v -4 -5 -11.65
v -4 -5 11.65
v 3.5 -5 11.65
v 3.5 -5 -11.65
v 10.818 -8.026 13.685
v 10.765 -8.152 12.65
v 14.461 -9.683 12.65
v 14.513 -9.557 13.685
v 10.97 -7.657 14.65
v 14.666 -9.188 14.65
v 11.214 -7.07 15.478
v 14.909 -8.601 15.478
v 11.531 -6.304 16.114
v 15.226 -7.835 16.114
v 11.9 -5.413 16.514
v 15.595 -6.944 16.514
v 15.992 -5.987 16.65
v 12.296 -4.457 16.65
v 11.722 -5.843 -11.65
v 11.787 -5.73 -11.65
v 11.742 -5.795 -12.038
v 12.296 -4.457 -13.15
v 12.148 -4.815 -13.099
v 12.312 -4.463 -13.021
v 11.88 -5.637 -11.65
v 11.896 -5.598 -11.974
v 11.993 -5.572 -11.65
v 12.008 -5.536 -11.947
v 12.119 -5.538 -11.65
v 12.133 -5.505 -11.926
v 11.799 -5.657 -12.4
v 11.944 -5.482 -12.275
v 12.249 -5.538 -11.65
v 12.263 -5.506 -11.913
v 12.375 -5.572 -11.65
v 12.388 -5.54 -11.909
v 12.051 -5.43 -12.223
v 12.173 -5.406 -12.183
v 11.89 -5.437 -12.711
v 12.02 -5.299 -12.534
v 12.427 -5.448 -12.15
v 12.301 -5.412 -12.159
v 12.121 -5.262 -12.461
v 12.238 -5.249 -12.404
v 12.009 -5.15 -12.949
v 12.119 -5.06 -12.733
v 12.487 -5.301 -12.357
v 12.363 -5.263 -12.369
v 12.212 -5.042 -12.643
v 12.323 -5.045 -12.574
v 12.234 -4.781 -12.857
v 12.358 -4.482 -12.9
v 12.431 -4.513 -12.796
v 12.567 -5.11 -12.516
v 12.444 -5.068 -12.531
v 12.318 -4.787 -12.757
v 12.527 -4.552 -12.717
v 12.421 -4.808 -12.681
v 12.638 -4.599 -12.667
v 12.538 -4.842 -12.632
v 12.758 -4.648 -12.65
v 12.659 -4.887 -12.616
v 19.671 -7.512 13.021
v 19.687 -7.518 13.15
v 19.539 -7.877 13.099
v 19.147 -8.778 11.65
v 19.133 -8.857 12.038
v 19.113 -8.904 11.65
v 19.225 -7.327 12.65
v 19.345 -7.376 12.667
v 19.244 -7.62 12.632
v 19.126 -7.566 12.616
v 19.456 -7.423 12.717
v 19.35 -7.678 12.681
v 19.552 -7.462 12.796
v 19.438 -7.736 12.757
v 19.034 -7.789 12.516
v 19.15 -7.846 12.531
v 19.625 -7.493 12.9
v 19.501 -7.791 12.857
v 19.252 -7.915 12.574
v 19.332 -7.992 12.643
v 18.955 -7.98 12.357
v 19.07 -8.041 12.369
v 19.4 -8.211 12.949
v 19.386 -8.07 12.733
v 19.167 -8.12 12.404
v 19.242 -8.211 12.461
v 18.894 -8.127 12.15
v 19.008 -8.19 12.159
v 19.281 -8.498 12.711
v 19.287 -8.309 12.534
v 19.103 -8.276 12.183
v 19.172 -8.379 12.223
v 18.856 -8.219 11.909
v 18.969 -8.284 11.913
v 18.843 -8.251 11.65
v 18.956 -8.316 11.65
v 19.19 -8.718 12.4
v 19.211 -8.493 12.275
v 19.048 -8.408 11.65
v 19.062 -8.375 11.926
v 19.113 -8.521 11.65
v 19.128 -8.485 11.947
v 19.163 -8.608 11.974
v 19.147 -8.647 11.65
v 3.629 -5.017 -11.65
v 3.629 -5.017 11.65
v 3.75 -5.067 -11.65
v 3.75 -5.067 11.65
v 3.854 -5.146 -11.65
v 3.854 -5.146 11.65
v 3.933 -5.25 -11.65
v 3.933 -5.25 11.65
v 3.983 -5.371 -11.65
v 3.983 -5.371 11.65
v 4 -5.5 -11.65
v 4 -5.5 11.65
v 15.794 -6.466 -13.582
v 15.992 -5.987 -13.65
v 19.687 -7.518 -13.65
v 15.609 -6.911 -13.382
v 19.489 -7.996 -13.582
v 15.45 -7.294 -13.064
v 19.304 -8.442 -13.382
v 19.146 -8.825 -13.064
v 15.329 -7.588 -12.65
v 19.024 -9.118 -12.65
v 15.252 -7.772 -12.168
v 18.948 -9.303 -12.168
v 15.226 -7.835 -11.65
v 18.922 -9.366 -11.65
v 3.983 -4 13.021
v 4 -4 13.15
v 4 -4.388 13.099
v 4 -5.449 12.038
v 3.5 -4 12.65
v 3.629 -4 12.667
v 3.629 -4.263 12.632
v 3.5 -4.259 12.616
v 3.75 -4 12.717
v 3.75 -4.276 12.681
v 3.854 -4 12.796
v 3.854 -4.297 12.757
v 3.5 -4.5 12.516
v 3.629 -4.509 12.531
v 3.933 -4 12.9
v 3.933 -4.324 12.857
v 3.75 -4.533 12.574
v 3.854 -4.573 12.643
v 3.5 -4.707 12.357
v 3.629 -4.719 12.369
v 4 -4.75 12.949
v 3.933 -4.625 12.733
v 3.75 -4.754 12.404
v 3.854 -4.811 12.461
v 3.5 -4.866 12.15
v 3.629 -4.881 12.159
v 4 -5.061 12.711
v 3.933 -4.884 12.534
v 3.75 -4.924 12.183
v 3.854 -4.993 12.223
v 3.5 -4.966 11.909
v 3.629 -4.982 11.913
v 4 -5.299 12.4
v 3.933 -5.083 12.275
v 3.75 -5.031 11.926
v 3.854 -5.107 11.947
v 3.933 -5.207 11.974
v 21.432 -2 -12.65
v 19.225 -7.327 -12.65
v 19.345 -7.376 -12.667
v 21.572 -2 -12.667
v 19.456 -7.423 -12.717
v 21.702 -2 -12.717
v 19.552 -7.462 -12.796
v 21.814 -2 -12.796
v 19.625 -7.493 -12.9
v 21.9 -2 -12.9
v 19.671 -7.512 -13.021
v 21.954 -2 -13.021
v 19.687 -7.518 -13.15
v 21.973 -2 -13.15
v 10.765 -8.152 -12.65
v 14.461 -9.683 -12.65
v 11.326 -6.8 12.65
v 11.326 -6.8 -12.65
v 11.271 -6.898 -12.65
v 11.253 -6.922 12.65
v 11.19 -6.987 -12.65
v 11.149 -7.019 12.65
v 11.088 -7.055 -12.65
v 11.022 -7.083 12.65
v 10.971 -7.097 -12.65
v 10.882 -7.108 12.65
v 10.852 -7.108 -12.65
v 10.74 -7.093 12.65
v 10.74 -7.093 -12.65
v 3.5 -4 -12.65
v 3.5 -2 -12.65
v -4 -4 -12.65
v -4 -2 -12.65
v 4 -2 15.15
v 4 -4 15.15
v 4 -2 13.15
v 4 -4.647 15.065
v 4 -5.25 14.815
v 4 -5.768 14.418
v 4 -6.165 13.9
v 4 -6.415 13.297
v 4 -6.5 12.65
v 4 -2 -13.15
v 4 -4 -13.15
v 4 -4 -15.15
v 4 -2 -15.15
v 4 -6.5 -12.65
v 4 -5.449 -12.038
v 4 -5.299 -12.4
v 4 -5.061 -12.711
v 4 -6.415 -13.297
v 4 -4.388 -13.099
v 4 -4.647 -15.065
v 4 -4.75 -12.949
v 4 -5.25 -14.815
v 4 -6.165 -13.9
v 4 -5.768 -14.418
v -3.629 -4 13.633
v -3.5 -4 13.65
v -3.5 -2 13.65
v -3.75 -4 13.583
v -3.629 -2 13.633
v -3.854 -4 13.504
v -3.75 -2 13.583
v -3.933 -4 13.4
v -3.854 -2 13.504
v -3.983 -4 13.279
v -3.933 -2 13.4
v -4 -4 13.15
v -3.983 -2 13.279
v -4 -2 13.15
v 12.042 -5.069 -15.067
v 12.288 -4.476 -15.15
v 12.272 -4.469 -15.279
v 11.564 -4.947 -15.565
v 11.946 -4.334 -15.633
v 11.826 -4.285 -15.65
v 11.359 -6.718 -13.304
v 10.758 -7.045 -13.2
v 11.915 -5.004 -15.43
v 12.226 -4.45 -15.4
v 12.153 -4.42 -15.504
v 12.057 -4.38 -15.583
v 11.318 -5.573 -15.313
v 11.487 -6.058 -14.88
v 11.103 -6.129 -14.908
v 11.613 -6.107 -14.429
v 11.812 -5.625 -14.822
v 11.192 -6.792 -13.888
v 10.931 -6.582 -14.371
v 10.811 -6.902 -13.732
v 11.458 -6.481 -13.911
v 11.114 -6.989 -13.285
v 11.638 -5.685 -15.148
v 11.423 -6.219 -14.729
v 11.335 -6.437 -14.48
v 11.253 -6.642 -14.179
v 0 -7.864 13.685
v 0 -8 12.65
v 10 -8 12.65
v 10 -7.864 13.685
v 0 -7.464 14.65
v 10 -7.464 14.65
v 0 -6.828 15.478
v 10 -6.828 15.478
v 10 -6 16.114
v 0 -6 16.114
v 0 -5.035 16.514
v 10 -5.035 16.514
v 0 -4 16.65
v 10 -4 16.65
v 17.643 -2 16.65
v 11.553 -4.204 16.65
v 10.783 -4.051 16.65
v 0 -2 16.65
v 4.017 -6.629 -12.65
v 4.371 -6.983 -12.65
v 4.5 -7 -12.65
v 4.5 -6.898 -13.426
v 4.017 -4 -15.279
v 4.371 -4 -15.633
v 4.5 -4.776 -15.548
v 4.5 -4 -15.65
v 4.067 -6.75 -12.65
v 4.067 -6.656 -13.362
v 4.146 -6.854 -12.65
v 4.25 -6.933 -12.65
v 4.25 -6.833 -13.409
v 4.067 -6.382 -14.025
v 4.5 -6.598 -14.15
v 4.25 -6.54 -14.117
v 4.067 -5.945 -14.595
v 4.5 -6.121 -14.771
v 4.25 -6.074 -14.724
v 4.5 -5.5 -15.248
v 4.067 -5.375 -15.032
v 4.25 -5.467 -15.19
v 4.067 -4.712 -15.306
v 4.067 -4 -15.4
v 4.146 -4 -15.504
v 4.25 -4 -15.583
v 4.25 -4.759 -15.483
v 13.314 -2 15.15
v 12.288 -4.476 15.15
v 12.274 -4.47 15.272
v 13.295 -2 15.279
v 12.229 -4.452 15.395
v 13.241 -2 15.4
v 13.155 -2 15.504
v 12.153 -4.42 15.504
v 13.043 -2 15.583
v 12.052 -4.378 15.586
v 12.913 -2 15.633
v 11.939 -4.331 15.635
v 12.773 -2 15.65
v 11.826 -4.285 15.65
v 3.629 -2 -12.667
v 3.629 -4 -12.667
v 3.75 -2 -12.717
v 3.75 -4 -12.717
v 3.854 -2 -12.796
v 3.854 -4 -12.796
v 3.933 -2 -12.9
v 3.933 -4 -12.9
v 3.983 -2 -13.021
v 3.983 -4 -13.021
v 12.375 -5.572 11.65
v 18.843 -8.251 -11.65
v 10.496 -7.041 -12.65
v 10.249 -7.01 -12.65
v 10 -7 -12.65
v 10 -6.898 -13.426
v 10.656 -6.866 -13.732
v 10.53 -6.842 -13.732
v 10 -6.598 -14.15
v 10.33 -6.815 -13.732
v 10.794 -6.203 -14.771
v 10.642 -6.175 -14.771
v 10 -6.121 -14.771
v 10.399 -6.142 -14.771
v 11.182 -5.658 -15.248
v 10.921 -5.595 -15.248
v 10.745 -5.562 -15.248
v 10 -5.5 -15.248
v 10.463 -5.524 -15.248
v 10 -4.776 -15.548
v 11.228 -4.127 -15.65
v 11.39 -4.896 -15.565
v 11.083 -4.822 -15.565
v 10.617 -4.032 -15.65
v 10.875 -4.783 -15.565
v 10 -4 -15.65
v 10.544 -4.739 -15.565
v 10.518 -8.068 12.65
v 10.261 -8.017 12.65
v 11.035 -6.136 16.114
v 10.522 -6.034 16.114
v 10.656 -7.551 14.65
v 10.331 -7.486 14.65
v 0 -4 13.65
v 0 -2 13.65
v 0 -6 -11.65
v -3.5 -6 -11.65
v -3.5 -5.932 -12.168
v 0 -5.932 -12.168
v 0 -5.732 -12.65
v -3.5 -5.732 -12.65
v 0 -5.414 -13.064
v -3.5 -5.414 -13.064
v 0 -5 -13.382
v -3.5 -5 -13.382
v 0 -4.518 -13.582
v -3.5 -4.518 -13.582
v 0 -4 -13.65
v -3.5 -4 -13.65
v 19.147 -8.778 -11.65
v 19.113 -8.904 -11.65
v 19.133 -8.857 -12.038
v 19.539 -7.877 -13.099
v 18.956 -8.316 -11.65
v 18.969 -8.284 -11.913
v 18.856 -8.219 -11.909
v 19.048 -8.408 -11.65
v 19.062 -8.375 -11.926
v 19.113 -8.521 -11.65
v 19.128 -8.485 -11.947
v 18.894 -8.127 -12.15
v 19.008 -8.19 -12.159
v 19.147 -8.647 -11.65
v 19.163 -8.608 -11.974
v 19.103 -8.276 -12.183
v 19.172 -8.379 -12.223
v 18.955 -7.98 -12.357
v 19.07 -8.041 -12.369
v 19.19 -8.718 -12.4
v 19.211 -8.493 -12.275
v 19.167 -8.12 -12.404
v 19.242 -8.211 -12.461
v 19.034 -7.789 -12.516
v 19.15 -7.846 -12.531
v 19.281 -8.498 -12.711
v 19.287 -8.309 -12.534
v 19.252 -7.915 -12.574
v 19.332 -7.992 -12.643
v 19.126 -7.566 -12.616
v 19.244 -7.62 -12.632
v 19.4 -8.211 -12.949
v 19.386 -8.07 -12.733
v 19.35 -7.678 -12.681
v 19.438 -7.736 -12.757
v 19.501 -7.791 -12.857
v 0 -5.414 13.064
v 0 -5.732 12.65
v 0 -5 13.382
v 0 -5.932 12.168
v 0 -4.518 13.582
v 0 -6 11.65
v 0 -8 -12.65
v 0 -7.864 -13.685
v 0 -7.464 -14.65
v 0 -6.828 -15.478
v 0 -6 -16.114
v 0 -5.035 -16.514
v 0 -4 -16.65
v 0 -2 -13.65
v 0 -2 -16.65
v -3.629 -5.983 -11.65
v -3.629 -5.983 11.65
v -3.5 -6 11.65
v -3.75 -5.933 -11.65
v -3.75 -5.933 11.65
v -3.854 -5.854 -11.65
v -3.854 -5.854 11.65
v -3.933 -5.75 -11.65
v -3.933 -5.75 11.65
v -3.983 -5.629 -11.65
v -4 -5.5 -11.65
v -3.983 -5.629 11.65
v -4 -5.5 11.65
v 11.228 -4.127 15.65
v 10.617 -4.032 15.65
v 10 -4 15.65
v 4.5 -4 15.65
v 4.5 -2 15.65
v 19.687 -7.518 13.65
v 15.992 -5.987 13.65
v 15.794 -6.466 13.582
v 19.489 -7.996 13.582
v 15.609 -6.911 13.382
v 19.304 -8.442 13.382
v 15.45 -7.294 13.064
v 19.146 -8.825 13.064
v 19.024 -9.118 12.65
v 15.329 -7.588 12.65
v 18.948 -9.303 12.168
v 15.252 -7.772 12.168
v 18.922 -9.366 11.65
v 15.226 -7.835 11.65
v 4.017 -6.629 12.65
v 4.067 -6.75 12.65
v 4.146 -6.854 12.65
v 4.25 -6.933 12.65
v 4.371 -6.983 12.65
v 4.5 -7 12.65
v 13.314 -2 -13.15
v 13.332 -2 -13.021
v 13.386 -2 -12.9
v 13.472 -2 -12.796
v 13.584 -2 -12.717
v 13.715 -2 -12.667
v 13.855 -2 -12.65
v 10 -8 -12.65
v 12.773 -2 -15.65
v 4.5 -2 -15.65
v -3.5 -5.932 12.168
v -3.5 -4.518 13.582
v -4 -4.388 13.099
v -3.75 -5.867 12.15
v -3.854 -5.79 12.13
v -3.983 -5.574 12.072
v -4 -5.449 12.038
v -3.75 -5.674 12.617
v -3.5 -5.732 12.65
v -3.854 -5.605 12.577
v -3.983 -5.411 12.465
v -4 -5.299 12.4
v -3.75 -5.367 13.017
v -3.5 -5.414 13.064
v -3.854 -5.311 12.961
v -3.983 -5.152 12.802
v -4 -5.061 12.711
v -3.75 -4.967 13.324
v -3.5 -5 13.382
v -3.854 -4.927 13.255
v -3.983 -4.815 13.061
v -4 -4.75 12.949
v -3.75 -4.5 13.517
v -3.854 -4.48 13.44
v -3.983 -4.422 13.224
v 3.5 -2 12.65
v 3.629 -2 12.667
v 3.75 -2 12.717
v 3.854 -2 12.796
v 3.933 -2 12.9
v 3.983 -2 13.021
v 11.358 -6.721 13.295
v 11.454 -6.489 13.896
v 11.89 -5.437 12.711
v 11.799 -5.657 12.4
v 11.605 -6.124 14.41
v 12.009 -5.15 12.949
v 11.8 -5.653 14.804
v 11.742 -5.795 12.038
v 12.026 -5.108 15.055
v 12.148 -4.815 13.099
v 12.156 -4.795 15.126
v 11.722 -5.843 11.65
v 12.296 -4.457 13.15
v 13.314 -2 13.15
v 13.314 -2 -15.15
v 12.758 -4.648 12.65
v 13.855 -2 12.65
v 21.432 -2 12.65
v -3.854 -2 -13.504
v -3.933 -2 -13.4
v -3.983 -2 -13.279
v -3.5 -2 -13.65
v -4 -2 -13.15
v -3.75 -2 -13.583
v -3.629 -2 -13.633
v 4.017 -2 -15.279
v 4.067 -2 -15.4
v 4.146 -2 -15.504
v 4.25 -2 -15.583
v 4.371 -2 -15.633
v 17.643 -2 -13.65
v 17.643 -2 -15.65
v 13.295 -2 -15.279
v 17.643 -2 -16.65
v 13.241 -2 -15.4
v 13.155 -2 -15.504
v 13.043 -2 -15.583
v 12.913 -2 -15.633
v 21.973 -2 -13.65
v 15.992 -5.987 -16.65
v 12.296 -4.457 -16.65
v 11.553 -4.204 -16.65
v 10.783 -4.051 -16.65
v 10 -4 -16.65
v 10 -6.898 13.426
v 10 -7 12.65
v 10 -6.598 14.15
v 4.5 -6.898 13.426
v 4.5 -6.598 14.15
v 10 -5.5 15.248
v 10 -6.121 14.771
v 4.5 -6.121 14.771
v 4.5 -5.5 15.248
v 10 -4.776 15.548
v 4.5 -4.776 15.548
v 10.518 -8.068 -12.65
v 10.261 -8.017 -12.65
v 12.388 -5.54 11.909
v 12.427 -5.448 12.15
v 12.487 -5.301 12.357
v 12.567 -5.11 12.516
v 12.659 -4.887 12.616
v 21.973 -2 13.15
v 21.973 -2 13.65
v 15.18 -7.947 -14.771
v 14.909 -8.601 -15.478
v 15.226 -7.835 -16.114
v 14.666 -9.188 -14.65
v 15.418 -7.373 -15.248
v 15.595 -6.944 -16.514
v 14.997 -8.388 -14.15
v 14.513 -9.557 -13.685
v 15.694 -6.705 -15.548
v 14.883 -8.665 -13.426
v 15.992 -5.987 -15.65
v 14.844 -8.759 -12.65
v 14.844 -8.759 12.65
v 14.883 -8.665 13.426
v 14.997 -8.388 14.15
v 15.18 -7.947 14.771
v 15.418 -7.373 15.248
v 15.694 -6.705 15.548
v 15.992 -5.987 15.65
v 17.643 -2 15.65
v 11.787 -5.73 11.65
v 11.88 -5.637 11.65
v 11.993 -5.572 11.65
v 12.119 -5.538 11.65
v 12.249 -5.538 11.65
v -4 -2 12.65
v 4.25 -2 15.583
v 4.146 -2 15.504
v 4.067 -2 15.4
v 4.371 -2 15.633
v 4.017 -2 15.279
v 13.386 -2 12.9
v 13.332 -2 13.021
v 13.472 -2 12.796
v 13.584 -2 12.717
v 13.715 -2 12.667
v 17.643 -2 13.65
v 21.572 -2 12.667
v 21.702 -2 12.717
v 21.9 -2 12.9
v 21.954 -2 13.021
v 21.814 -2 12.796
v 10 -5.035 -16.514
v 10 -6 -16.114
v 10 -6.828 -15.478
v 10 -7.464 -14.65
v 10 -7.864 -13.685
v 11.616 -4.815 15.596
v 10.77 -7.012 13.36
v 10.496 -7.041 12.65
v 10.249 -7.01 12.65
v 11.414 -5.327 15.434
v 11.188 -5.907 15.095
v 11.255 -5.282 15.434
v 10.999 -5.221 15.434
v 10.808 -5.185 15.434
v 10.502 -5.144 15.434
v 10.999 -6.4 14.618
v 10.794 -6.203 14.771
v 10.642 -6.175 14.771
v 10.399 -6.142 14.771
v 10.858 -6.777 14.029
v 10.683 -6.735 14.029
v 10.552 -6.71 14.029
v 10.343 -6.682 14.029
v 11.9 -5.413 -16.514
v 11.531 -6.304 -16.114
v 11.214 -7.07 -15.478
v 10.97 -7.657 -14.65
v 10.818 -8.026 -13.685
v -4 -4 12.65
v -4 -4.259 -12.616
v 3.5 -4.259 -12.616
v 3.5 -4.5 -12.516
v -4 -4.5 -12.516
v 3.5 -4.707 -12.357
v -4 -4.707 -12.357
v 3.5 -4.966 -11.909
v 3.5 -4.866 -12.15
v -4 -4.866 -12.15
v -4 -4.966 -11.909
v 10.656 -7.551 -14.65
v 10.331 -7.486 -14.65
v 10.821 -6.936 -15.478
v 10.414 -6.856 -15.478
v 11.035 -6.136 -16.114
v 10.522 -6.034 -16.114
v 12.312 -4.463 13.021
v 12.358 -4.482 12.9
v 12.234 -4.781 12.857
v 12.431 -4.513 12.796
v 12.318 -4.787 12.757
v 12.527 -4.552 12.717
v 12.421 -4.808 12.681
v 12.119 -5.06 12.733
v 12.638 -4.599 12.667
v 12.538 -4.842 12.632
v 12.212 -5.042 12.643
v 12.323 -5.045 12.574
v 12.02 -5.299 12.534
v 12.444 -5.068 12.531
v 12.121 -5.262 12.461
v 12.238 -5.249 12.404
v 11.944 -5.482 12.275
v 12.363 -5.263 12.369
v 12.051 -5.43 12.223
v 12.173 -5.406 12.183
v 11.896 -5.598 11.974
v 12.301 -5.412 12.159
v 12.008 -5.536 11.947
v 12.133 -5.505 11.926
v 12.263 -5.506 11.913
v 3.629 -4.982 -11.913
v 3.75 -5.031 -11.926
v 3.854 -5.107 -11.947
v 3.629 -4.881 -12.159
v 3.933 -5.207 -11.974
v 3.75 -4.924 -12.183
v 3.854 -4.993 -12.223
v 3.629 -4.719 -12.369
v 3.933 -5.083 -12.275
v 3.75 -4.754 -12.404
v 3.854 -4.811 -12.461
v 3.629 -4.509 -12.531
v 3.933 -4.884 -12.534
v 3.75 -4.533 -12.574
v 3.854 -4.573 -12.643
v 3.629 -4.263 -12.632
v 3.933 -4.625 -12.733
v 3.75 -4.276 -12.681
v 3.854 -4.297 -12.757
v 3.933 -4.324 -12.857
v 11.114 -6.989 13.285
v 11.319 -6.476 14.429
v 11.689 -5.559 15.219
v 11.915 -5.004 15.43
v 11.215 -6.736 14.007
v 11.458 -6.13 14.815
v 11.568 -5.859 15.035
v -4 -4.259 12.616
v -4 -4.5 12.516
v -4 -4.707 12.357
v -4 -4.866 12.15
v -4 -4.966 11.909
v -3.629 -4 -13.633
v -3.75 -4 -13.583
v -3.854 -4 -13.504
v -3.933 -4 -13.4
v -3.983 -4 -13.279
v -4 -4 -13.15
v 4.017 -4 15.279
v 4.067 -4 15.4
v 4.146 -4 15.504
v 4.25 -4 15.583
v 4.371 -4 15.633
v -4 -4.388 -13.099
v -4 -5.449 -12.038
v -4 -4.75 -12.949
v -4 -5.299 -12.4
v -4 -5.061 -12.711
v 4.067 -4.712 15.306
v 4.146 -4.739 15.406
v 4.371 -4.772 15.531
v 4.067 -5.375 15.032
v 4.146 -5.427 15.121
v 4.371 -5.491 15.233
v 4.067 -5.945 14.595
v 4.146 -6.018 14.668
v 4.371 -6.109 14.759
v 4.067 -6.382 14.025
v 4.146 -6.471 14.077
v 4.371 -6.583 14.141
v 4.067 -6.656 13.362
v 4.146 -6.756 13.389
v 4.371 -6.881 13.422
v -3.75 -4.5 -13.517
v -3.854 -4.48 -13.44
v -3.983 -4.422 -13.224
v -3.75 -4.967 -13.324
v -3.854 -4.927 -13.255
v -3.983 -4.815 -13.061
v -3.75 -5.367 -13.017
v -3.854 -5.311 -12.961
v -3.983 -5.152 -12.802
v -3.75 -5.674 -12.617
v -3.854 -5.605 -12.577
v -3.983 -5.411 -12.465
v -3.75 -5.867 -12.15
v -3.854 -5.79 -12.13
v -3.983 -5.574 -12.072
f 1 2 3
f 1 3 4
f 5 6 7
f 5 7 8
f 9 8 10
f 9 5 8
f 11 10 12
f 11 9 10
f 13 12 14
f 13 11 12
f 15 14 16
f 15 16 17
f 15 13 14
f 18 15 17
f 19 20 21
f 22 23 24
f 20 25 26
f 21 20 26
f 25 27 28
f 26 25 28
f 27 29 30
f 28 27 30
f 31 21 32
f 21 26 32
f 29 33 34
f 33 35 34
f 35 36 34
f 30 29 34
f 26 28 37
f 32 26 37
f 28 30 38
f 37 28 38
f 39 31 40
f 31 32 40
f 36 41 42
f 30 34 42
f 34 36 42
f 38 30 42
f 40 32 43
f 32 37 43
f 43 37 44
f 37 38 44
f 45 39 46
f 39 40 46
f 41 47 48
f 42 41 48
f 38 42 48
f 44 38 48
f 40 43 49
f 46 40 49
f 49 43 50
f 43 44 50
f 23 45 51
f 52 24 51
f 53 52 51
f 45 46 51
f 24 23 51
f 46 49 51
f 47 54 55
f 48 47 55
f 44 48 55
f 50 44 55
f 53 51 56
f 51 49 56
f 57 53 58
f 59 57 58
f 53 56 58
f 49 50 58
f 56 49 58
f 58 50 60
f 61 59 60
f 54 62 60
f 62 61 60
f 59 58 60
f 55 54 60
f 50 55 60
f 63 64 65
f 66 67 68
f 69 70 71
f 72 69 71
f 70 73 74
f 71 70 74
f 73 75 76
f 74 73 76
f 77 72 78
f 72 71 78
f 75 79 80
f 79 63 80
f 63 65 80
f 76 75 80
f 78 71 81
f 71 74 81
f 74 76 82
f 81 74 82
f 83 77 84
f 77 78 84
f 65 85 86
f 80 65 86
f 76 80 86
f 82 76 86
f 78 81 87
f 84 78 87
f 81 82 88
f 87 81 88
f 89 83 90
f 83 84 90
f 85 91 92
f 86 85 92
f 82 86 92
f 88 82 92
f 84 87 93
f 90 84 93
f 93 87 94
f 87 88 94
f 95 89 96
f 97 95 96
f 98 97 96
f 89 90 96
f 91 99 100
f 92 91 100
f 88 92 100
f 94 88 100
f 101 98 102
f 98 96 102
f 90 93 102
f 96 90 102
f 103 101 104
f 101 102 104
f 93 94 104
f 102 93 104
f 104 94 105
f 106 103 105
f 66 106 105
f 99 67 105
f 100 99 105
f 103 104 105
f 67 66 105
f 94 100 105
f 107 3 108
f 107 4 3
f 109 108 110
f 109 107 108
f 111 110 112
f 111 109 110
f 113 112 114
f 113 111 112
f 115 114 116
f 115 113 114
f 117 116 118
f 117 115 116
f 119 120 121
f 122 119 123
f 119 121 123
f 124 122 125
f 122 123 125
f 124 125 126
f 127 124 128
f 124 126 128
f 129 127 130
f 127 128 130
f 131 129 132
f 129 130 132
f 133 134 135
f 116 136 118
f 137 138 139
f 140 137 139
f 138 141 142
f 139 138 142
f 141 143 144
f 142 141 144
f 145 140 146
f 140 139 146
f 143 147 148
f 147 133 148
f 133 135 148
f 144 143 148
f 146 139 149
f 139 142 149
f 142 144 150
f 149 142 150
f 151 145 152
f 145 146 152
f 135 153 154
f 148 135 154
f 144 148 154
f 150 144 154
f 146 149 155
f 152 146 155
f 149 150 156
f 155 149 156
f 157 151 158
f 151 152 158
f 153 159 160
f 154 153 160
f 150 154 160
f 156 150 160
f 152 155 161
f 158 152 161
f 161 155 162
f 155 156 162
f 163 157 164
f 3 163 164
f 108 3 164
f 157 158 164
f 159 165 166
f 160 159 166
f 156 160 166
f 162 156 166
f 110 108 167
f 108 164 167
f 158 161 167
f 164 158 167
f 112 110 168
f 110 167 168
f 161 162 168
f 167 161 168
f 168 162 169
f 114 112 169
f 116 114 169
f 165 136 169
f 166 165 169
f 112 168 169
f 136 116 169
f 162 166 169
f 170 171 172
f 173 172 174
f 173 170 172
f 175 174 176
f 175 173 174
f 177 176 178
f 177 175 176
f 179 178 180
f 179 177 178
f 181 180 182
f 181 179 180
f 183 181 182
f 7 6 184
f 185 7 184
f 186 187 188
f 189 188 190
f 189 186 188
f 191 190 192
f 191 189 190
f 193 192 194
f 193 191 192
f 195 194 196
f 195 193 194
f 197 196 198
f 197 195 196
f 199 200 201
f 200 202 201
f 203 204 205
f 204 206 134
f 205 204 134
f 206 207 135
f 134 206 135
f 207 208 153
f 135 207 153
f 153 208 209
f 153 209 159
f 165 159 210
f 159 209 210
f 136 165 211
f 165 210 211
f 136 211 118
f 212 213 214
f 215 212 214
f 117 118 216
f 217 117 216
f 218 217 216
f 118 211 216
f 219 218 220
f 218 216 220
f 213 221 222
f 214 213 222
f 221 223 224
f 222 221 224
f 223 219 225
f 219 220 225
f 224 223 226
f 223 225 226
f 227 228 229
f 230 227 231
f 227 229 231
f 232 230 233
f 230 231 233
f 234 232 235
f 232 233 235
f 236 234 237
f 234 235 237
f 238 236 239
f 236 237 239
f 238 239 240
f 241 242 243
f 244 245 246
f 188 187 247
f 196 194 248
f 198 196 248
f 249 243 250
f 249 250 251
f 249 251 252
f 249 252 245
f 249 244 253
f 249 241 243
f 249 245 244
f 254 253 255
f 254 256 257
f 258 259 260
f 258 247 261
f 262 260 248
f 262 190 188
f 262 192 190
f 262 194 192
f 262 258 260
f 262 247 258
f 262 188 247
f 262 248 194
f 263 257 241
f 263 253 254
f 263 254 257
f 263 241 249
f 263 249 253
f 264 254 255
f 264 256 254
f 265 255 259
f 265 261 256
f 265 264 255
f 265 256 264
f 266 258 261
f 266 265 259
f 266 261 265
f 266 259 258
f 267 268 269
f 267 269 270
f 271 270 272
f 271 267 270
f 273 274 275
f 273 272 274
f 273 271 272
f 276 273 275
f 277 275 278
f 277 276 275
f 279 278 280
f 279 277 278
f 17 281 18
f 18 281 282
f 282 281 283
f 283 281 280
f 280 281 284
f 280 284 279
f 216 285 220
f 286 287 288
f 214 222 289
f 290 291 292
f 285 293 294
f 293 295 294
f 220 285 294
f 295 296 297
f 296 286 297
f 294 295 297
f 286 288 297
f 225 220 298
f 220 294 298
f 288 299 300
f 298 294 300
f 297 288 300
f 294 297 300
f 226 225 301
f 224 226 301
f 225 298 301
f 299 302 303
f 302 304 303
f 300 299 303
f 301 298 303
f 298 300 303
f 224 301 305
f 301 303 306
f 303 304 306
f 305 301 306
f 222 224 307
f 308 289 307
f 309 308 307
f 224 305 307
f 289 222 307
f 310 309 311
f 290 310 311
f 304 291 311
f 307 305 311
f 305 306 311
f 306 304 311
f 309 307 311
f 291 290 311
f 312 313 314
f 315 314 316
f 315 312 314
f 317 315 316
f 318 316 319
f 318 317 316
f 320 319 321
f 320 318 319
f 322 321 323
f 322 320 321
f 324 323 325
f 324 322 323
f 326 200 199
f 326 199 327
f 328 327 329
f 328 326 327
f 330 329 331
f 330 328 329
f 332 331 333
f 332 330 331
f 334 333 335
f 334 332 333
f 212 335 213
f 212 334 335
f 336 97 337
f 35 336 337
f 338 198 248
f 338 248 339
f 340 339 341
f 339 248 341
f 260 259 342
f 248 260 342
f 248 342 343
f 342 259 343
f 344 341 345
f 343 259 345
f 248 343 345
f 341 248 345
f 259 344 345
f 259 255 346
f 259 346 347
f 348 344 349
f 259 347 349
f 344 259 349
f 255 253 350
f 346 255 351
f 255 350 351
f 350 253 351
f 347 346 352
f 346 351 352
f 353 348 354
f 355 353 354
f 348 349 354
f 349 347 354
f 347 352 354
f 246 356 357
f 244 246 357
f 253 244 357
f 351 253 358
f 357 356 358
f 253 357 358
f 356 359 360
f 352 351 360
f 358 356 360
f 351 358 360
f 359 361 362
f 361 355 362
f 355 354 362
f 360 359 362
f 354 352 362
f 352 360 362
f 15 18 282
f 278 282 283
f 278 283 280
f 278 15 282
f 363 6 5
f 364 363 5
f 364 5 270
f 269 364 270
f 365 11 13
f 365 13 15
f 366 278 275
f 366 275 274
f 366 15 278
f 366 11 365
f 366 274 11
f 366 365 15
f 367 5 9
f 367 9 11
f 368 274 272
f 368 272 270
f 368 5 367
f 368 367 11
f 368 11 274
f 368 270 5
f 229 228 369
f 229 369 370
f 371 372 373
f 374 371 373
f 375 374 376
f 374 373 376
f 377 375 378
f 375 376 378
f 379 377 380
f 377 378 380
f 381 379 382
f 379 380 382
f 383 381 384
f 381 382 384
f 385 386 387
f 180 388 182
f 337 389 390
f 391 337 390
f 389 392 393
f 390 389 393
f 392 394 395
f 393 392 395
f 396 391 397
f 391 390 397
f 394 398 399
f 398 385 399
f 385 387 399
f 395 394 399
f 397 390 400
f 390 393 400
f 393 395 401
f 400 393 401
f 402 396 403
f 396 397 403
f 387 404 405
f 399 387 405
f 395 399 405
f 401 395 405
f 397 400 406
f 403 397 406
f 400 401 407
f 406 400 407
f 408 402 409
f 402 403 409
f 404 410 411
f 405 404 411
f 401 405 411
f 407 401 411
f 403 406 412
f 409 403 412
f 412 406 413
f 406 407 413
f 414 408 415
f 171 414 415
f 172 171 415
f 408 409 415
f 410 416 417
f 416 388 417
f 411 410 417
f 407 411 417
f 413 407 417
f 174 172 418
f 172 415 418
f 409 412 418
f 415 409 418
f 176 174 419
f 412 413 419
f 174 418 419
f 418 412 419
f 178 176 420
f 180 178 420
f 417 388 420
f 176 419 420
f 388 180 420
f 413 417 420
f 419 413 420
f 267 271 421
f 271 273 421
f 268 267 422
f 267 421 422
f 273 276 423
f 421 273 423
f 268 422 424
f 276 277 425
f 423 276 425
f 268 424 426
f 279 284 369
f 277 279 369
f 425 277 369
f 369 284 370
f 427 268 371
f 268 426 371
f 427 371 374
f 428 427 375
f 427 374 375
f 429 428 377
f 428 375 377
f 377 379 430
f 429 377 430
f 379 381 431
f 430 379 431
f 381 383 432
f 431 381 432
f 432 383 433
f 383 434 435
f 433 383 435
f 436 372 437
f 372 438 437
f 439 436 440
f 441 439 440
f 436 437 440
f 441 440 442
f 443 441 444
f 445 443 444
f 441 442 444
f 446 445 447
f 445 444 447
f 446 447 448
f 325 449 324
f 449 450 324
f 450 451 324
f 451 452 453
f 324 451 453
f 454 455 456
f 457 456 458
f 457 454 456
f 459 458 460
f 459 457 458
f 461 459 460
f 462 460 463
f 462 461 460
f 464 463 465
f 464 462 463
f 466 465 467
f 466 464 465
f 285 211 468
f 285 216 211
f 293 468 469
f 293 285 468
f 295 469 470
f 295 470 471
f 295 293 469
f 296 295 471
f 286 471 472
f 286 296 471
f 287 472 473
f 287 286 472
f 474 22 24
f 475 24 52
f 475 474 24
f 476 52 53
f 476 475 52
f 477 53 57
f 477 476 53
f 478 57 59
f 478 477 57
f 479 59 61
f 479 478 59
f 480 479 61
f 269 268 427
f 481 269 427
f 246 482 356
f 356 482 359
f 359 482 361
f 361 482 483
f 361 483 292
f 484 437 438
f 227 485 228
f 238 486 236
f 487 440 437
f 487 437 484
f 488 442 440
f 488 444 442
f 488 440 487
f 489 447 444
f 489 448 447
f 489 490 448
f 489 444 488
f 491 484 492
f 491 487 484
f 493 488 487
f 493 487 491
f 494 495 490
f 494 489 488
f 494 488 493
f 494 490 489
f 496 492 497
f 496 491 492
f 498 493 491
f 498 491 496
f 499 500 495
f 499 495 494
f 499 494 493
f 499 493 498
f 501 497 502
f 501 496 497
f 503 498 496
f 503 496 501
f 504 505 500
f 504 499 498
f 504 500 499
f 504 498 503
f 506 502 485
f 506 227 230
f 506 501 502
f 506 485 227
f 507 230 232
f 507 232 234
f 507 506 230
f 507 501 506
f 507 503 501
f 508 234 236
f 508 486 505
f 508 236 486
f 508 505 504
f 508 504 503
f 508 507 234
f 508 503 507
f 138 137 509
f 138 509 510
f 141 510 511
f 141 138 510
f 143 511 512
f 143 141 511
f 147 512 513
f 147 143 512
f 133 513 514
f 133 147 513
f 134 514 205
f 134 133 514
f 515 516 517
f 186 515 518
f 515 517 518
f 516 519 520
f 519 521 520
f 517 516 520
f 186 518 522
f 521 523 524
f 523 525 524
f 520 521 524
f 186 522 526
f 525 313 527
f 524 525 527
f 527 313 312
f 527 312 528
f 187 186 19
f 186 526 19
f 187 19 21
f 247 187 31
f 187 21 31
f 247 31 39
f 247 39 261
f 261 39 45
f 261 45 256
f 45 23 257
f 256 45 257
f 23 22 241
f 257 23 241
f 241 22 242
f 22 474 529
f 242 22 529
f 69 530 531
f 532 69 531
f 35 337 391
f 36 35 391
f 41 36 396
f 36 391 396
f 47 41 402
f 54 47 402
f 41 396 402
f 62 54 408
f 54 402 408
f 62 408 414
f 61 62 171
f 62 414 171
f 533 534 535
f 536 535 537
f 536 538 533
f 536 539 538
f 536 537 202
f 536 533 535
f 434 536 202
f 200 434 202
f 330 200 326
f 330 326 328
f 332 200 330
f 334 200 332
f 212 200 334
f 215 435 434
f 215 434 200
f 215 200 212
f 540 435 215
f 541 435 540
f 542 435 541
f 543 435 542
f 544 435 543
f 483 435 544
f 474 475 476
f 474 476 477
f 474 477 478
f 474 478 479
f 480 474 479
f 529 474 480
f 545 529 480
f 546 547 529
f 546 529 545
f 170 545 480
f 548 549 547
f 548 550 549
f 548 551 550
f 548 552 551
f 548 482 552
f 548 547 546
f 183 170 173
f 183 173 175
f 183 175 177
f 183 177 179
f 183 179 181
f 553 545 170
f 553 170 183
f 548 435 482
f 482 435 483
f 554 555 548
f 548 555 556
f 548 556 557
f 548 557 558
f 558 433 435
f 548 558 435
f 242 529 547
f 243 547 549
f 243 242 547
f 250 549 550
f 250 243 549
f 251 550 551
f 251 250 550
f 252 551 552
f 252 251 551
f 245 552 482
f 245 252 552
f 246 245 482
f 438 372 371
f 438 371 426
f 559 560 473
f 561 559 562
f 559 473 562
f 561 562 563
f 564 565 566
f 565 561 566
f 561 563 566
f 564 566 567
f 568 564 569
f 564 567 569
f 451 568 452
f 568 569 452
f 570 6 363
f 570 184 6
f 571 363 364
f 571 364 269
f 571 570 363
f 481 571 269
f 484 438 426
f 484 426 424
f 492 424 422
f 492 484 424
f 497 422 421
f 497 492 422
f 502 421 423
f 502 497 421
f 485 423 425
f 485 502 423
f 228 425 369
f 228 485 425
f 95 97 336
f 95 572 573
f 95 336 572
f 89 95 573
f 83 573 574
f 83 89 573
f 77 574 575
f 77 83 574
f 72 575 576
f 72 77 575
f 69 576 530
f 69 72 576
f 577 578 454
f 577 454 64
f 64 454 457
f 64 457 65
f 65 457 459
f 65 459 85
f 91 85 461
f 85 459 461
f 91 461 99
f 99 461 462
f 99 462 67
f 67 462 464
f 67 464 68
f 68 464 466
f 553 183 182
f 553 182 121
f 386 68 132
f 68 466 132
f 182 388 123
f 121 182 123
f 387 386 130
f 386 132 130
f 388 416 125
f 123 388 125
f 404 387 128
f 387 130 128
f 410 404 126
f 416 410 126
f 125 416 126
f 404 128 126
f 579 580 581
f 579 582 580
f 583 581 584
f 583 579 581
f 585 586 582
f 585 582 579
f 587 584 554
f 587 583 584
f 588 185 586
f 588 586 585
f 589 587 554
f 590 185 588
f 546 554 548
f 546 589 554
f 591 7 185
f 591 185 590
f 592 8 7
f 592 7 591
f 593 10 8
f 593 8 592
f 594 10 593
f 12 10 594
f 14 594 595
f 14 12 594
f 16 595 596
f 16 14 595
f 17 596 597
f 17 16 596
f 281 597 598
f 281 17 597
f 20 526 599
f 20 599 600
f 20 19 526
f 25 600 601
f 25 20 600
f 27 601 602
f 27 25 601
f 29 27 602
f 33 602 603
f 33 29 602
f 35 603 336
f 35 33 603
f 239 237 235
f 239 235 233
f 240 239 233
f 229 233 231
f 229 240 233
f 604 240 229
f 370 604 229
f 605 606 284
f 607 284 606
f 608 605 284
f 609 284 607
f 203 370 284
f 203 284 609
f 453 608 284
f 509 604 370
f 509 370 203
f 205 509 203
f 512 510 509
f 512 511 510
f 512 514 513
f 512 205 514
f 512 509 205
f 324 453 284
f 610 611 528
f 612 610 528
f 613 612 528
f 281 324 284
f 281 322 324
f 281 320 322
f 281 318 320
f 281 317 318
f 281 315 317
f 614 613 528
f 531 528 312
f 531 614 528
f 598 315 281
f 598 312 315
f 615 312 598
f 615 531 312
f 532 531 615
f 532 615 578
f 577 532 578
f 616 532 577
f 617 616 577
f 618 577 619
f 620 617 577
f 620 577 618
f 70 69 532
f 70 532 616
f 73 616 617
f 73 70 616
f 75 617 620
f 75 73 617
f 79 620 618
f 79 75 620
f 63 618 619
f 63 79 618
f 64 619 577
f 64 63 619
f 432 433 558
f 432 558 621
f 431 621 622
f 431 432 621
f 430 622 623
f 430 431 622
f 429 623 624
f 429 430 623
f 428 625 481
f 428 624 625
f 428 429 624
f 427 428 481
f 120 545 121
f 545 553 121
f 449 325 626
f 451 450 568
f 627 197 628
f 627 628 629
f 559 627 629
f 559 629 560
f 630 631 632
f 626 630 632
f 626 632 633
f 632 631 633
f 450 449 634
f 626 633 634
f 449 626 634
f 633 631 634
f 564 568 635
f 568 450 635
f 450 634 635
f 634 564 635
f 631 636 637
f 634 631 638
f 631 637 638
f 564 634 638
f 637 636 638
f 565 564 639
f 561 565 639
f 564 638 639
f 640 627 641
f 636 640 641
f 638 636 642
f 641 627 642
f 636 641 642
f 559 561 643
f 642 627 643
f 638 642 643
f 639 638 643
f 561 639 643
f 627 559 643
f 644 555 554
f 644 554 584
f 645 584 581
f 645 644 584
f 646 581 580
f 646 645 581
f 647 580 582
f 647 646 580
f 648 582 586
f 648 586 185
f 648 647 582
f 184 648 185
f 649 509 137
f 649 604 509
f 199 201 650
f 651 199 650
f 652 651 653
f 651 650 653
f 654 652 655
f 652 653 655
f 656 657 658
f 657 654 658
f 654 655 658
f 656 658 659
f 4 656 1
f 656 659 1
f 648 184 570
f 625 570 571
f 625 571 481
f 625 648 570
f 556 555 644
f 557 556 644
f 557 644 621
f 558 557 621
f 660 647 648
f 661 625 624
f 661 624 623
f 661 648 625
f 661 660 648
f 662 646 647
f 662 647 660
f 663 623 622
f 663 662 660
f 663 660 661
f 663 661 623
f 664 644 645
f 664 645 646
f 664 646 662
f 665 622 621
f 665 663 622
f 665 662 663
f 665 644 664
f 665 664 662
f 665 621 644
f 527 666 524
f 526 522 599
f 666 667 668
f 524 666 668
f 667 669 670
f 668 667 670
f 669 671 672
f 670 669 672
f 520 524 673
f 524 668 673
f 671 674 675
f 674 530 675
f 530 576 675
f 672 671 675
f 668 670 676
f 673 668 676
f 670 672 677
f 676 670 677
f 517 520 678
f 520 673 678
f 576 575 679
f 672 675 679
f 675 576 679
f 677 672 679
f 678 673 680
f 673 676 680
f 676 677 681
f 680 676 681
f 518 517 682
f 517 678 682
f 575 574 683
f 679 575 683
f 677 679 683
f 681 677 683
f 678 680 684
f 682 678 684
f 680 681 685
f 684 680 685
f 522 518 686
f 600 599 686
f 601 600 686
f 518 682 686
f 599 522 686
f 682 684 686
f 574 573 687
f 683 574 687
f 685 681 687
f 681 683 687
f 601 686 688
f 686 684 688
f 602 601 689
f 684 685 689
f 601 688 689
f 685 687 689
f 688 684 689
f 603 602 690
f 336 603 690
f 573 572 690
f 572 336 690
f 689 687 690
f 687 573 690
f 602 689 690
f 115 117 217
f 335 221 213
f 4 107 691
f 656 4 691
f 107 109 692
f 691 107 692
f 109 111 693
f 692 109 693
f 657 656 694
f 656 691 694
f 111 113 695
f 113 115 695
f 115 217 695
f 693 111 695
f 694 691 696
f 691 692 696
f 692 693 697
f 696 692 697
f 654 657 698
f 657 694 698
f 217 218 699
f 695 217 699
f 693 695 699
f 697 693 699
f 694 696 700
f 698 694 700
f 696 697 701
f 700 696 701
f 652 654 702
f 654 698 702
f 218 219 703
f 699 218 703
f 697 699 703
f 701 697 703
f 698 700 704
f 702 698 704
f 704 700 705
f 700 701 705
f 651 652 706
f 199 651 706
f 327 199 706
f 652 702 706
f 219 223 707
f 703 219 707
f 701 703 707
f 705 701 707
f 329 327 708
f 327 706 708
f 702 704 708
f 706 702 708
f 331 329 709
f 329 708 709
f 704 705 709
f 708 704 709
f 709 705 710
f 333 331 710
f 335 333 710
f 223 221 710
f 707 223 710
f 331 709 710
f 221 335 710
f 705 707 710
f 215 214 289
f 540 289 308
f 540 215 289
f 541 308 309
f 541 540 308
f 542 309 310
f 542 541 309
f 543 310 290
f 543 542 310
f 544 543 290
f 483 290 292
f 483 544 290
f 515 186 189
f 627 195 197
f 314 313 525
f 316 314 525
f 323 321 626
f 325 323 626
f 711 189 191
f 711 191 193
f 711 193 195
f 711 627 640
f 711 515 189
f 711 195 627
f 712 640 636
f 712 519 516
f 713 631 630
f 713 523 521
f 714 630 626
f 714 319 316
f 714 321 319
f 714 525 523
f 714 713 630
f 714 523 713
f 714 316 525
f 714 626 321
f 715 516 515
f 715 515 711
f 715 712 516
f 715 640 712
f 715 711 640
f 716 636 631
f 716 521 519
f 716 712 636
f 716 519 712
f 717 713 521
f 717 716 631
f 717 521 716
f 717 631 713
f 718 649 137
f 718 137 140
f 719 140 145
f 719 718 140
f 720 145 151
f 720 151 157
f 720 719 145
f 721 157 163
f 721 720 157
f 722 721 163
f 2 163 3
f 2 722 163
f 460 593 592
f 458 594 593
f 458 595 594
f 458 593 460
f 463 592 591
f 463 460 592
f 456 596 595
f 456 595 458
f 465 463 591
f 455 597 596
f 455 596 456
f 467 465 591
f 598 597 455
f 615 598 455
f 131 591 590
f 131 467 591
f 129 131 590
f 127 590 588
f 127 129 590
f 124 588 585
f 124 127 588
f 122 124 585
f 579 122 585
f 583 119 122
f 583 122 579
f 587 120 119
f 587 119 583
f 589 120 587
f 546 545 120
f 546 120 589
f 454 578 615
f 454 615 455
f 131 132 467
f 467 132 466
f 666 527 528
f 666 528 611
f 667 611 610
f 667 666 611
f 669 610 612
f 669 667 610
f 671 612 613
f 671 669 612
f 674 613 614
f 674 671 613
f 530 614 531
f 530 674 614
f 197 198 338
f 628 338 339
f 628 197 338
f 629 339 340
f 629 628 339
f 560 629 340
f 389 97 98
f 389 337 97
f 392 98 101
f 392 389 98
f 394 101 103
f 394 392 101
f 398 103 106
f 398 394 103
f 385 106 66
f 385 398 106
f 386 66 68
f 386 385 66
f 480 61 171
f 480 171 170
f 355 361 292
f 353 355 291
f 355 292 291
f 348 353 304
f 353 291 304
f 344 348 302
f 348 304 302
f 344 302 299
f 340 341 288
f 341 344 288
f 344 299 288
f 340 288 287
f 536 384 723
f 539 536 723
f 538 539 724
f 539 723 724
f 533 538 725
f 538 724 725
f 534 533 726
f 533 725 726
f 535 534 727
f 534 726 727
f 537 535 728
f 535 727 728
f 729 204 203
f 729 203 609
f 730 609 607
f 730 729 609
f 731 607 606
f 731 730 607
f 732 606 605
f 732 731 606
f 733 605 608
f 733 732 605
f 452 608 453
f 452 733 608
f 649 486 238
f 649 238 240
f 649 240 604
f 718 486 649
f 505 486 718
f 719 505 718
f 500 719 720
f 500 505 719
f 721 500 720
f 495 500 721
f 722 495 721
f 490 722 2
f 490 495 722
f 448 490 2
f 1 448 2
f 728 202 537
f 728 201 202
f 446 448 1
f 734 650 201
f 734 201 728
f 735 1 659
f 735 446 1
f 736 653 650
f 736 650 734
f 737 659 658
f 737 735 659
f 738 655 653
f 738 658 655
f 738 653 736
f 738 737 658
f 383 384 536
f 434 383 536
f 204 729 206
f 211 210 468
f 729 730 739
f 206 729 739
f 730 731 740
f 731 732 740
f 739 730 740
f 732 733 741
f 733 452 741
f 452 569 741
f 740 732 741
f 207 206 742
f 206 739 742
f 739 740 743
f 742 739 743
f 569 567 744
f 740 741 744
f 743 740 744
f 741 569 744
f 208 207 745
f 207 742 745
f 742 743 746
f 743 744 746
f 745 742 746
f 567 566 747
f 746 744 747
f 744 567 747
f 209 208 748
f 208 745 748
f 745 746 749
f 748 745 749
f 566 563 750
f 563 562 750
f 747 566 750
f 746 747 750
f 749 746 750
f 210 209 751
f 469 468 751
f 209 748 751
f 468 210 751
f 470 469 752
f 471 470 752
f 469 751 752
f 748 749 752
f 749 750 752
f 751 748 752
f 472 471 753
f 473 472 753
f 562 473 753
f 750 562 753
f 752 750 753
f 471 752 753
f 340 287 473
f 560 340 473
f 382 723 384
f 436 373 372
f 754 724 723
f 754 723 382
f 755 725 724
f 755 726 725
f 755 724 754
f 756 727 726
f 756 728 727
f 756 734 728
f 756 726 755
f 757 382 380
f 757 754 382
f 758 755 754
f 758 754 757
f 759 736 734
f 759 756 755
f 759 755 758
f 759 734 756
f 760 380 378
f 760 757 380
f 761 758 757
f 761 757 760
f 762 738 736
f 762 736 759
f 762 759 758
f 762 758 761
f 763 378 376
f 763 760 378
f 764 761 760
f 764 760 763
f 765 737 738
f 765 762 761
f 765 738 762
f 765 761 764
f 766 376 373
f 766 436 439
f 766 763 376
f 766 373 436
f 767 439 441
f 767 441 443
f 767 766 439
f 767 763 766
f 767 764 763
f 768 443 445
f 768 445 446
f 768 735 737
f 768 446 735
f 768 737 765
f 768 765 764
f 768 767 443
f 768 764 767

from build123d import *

# Parameters (mm, degrees)
BOSS_EXTRUDE6_DEPTH = 4
BOSS_EXTRUDE7_DEPTH = 4
FILLET5_R           = 0.5
BOSS_EXTRUDE8_DEPTH = 4
BOSS_EXTRUDE9_START = -4
BOSS_EXTRUDE9_DEPTH = 4
FILLET6_R           = 0.5


with BuildPart() as part:
    # Sweep1: sweep along a path in Sketch2path
    with BuildLine(Plane.XY) as sweep1_path:
        Line((17.522352454, -2.291938404), (13.826834324, -0.761204675))
        ThreePointArc((13.826834324, -0.761204675), (11.95090322, -0.192147196), (10, 0))
        Line((10, 0), (0, 0))
    # Sketch3 → Sweep1 (sweep)
    with BuildSketch(Plane(origin=(0, 0, 0), x_dir=(0, 0, -1), z_dir=(1, 0, 0))):
        with BuildLine():
            Line((-16.65, -4), (-16.65, 4))
            ThreePointArc((-16.65, 4), (-15.478427125, 6.828427125), (-12.65, 8))
            Line((-12.65, 8), (12.65, 8))
            ThreePointArc((12.65, 8), (15.478427125, 6.828427125), (16.65, 4))
            Line((16.65, 4), (16.65, -4))
            ThreePointArc((16.65, -4), (15.478427125, -6.828427125), (12.65, -8))
            Line((12.65, -8), (-12.65, -8))
            ThreePointArc((-12.65, -8), (-15.478427125, -6.828427125), (-16.65, -4))
        make_face()
        with BuildLine():
            Line((-15.65, -4), (-15.65, 4))
            ThreePointArc((-15.65, 4), (-14.771320344, 6.121320344), (-12.65, 7))
            Line((-12.65, 7), (12.65, 7))
            ThreePointArc((12.65, 7), (14.771320344, 6.121320344), (15.65, 4))
            Line((15.65, 4), (15.65, -4))
            ThreePointArc((15.65, -4), (14.771320344, -6.121320344), (12.65, -7))
            Line((12.65, -7), (-12.65, -7))
            ThreePointArc((-12.65, -7), (-14.771320344, -6.121320344), (-15.65, -4))
        make_face(mode=Mode.SUBTRACT)
    sweep(path=sweep1_path.line)



with BuildPart() as body_2:
    # Sketch18 → Boss-Extrude6 (new, symmetric)
    with BuildSketch(Plane.ZY):
        with BuildLine():
            Line((-11.65, 5), (0, 5))
            Line((0, 5), (0, 6))
            Line((0, 6), (-11.65, 6))
            ThreePointArc((-11.65, 6), (-13.064213562, 5.414213562), (-13.65, 4))
            Line((-13.65, 4), (-13.65, 0))
            Line((-13.65, 0), (-12.65, 0))
            Line((-12.65, 0), (-12.65, 4))
            ThreePointArc((-12.65, 4), (-12.357106781, 4.707106781), (-11.65, 5))
        make_face()
    extrude(amount=BOSS_EXTRUDE6_DEPTH, both=True)

    # Mirror6: body 2 across plane


with BuildPart() as body_2_1:
    add(body_2.part)
    add(body_2.part.mirror(Plane.XY))

    # Mirror7: body 2 across plane


with BuildPart() as body_2_2:
    add(body_2_1.part)
    add(body_2_1.part.mirror(Plane(origin=(-4, 0, 0), x_dir=(0, 0, 1), z_dir=(0, -1, 0))))


with BuildPart() as part_1:
    add(part.part)

    add(body_2_2.part)  # Boss-Extrude7 merges body 2
    # Sketch19 → Boss-Extrude7 (add)
    with BuildSketch(Plane.ZY):
        with BuildLine():
            Line((-15.65, -4), (-15.65, 4))
            ThreePointArc((-15.65, 4), (-14.771320344, 6.121320344), (-12.65, 7))
            Line((-12.65, 7), (12.65, 7))
            ThreePointArc((12.65, 7), (14.771320344, 6.121320344), (15.65, 4))
            Line((15.65, 4), (15.65, -4))
            ThreePointArc((15.65, -4), (14.771320344, -6.121320344), (12.65, -7))
            Line((12.65, -7), (-12.65, -7))
            ThreePointArc((-12.65, -7), (-14.771320344, -6.121320344), (-15.65, -4))
        make_face()
        with BuildLine():
            Line((-13.65, -4), (-13.65, 4))
            ThreePointArc((-13.65, 4), (-13.064213562, 5.414213562), (-11.65, 6))
            Line((-11.65, 6), (11.65, 6))
            ThreePointArc((11.65, 6), (13.064213562, 5.414213562), (13.65, 4))
            Line((13.65, 4), (13.65, -4))
            ThreePointArc((13.65, -4), (13.064213562, -5.414213562), (11.65, -6))
            Line((11.65, -6), (-11.65, -6))
            ThreePointArc((-11.65, -6), (-13.064213562, -5.414213562), (-13.65, -4))
        make_face(mode=Mode.SUBTRACT)
    extrude(amount=-BOSS_EXTRUDE7_DEPTH)

    # Fillet5
    fillet5_edges = [part_1.edges().sort_by_distance(p)[0] for p in [
        (4, -6.121320344, -14.771320344),
        (4, 0, -15.65),
        (4, 6.121320344, -14.771320344),
        (4, 7, 0),
        (4, 6.121320344, 14.771320344),
        (4, 0, 15.65),
        (4, -6.121320344, 14.771320344),
        (4, -7, 0),
        (-4, 0, -13.65),
        (-4, 6, 0),
        (-4, 5.414213562, 13.064213562),
        (-4, -5.414213562, -13.064213562),
        (4, 5, 0),
        (4, 0, -12.65),
        (-4, -6, 0),
        (-4, -5.414213562, 13.064213562),
        (-4, 0, 13.65),
        (-4, 5.414213562, -13.064213562),
        (4, 4.707106781, -12.357106781),
        (4, -5, 0),
        (4, -4.707106781, 12.357106781),
        (4, 0, 12.65),
        (4, 4.707106781, 12.357106781),
        (4, -4.707106781, -12.357106781),
    ]]
    fillet(fillet5_edges, radius=FILLET5_R)



with BuildPart() as body_2_2_1:
    # Sketch20 → Boss-Extrude8 (new, symmetric)
    with BuildSketch(Plane(origin=(15.766585942, -6.530733729, 0), x_dir=(0, 0, -1), z_dir=(0.9238795325112864, -0.38268343236509084, 0))):
        with BuildLine():
            ThreePointArc((-11.65, 9.588038999), (-12.357106781, 9.29514578), (-12.65, 8.588038999))
            Line((-12.65, 8.588038999), (-12.65, 4.588038999))
            Line((-12.65, 4.588038999), (-13.65, 4.588038999))
            Line((-13.65, 4.588038999), (-13.65, 8.588038999))
            ThreePointArc((-13.65, 8.588038999), (-13.064213562, 10.002252561), (-11.65, 10.588038999))
            Line((-11.65, 10.588038999), (0, 10.588038999))
            Line((0, 10.588038999), (0, 9.588038999))
            Line((0, 9.588038999), (-11.65, 9.588038999))
        make_face()
    extrude(amount=BOSS_EXTRUDE8_DEPTH, both=True)

    # Mirror8: body 2 2 across plane


with BuildPart() as body_2_2_2:
    add(body_2_2_1.part)
    add(body_2_2_1.part.mirror(Plane(origin=(1.755766512, 4.238795325, 0), x_dir=(0, 0, 1), z_dir=(0.3826834323650908, 0.9238795325112864, 0))))

    # Mirror9: body 2 2 across plane


with BuildPart() as body_2_2_3:
    add(body_2_2_2.part)
    add(body_2_2_2.part.mirror(Plane.XY))


with BuildPart() as part_2:
    add(part_1.part)

    add(body_2_2_3.part)  # Boss-Extrude9 merges body 2 2
    # Sketch21 → Boss-Extrude9 (add)
    with BuildSketch(Plane(origin=(15.766585942, -6.530733729, 0), x_dir=(0, 0, -1), z_dir=(0.9238795325112864, -0.38268343236509084, 0)).offset(BOSS_EXTRUDE9_START)):
        with BuildLine():
            Line((-15.65, 8.588038999), (-15.65, 0.588038999))
            ThreePointArc((-15.65, 0.588038999), (-14.771320344, -1.533281345), (-12.65, -2.411961001))
            Line((-12.65, -2.411961001), (12.65, -2.411961001))
            ThreePointArc((12.65, -2.411961001), (14.771320344, -1.533281345), (15.65, 0.588038999))
            Line((15.65, 0.588038999), (15.65, 8.588038999))
            ThreePointArc((15.65, 8.588038999), (14.771320344, 10.709359342), (12.65, 11.588038999))
            Line((12.65, 11.588038999), (-12.65, 11.588038999))
            ThreePointArc((-12.65, 11.588038999), (-14.771320344, 10.709359342), (-15.65, 8.588038999))
        make_face()
        with BuildLine():
            Line((-13.65, 8.588038999), (-13.65, 0.588038999))
            ThreePointArc((-13.65, 0.588038999), (-13.064213562, -0.826174564), (-11.65, -1.411961001))
            Line((-11.65, -1.411961001), (11.65, -1.411961001))
            ThreePointArc((11.65, -1.411961001), (13.064213562, -0.826174564), (13.65, 0.588038999))
            Line((13.65, 0.588038999), (13.65, 8.588038999))
            ThreePointArc((13.65, 8.588038999), (13.064213562, 10.002252561), (11.65, 10.588038999))
            Line((11.65, 10.588038999), (-11.65, 10.588038999))
            ThreePointArc((-11.65, 10.588038999), (-13.064213562, 10.002252561), (-13.65, 8.588038999))
        make_face(mode=Mode.SUBTRACT)
    extrude(amount=BOSS_EXTRUDE9_DEPTH)

    # Fillet6
    fillet6_edges = [part_2.edges().sort_by_distance(p)[0] for p in [
        (23.019202363, 0.526127479, 12.357106781),
        (23.131287746, 0.796725529, 0),
        (21.217870584, -3.822672134, 12.65),
        (23.019202363, 0.526127479, -12.357106781),
        (21.217870584, -3.822672134, -12.65),
        (19.304453422, -8.442069796, 0),
        (19.416538804, -8.171471746, 12.357106781),
        (15.628166103, 3.587594938, 12.357106781),
        (13.826834324, -0.761204675, 12.65),
        (12.025502544, -5.110004287, -12.357106781),
        (15.740251485, 3.858192988, 0),
        (12.025502544, -5.110004287, 12.357106781),
        (11.913417162, -5.380602337, 0),
        (15.628166103, 3.587594938, -12.357106781),
        (13.826834324, -0.761204675, -12.65),
        (19.416538804, -8.171471746, -12.357106781),
        (16.169362203, 4.894157902, 14.771320344),
        (13.826834324, -0.761204675, 15.65),
        (11.484306444, -6.416567252, 14.771320344),
        (11.148050297, -7.228361402, 0),
        (11.484306444, -6.416567252, -14.771320344),
        (13.826834324, -0.761204675, -15.65),
        (16.169362203, 4.894157902, -14.771320344),
        (16.50561835, 5.705952053, 0),
    ]]
    fillet(fillet6_edges, radius=FILLET6_R)

    # SurfaceCut1
    split(bisect_by=Plane(origin=(0, -2, 0), x_dir=(1, 0, 0), z_dir=(0, 1, 0)), keep=Keep.BOTTOM)


solid = part_2.part
